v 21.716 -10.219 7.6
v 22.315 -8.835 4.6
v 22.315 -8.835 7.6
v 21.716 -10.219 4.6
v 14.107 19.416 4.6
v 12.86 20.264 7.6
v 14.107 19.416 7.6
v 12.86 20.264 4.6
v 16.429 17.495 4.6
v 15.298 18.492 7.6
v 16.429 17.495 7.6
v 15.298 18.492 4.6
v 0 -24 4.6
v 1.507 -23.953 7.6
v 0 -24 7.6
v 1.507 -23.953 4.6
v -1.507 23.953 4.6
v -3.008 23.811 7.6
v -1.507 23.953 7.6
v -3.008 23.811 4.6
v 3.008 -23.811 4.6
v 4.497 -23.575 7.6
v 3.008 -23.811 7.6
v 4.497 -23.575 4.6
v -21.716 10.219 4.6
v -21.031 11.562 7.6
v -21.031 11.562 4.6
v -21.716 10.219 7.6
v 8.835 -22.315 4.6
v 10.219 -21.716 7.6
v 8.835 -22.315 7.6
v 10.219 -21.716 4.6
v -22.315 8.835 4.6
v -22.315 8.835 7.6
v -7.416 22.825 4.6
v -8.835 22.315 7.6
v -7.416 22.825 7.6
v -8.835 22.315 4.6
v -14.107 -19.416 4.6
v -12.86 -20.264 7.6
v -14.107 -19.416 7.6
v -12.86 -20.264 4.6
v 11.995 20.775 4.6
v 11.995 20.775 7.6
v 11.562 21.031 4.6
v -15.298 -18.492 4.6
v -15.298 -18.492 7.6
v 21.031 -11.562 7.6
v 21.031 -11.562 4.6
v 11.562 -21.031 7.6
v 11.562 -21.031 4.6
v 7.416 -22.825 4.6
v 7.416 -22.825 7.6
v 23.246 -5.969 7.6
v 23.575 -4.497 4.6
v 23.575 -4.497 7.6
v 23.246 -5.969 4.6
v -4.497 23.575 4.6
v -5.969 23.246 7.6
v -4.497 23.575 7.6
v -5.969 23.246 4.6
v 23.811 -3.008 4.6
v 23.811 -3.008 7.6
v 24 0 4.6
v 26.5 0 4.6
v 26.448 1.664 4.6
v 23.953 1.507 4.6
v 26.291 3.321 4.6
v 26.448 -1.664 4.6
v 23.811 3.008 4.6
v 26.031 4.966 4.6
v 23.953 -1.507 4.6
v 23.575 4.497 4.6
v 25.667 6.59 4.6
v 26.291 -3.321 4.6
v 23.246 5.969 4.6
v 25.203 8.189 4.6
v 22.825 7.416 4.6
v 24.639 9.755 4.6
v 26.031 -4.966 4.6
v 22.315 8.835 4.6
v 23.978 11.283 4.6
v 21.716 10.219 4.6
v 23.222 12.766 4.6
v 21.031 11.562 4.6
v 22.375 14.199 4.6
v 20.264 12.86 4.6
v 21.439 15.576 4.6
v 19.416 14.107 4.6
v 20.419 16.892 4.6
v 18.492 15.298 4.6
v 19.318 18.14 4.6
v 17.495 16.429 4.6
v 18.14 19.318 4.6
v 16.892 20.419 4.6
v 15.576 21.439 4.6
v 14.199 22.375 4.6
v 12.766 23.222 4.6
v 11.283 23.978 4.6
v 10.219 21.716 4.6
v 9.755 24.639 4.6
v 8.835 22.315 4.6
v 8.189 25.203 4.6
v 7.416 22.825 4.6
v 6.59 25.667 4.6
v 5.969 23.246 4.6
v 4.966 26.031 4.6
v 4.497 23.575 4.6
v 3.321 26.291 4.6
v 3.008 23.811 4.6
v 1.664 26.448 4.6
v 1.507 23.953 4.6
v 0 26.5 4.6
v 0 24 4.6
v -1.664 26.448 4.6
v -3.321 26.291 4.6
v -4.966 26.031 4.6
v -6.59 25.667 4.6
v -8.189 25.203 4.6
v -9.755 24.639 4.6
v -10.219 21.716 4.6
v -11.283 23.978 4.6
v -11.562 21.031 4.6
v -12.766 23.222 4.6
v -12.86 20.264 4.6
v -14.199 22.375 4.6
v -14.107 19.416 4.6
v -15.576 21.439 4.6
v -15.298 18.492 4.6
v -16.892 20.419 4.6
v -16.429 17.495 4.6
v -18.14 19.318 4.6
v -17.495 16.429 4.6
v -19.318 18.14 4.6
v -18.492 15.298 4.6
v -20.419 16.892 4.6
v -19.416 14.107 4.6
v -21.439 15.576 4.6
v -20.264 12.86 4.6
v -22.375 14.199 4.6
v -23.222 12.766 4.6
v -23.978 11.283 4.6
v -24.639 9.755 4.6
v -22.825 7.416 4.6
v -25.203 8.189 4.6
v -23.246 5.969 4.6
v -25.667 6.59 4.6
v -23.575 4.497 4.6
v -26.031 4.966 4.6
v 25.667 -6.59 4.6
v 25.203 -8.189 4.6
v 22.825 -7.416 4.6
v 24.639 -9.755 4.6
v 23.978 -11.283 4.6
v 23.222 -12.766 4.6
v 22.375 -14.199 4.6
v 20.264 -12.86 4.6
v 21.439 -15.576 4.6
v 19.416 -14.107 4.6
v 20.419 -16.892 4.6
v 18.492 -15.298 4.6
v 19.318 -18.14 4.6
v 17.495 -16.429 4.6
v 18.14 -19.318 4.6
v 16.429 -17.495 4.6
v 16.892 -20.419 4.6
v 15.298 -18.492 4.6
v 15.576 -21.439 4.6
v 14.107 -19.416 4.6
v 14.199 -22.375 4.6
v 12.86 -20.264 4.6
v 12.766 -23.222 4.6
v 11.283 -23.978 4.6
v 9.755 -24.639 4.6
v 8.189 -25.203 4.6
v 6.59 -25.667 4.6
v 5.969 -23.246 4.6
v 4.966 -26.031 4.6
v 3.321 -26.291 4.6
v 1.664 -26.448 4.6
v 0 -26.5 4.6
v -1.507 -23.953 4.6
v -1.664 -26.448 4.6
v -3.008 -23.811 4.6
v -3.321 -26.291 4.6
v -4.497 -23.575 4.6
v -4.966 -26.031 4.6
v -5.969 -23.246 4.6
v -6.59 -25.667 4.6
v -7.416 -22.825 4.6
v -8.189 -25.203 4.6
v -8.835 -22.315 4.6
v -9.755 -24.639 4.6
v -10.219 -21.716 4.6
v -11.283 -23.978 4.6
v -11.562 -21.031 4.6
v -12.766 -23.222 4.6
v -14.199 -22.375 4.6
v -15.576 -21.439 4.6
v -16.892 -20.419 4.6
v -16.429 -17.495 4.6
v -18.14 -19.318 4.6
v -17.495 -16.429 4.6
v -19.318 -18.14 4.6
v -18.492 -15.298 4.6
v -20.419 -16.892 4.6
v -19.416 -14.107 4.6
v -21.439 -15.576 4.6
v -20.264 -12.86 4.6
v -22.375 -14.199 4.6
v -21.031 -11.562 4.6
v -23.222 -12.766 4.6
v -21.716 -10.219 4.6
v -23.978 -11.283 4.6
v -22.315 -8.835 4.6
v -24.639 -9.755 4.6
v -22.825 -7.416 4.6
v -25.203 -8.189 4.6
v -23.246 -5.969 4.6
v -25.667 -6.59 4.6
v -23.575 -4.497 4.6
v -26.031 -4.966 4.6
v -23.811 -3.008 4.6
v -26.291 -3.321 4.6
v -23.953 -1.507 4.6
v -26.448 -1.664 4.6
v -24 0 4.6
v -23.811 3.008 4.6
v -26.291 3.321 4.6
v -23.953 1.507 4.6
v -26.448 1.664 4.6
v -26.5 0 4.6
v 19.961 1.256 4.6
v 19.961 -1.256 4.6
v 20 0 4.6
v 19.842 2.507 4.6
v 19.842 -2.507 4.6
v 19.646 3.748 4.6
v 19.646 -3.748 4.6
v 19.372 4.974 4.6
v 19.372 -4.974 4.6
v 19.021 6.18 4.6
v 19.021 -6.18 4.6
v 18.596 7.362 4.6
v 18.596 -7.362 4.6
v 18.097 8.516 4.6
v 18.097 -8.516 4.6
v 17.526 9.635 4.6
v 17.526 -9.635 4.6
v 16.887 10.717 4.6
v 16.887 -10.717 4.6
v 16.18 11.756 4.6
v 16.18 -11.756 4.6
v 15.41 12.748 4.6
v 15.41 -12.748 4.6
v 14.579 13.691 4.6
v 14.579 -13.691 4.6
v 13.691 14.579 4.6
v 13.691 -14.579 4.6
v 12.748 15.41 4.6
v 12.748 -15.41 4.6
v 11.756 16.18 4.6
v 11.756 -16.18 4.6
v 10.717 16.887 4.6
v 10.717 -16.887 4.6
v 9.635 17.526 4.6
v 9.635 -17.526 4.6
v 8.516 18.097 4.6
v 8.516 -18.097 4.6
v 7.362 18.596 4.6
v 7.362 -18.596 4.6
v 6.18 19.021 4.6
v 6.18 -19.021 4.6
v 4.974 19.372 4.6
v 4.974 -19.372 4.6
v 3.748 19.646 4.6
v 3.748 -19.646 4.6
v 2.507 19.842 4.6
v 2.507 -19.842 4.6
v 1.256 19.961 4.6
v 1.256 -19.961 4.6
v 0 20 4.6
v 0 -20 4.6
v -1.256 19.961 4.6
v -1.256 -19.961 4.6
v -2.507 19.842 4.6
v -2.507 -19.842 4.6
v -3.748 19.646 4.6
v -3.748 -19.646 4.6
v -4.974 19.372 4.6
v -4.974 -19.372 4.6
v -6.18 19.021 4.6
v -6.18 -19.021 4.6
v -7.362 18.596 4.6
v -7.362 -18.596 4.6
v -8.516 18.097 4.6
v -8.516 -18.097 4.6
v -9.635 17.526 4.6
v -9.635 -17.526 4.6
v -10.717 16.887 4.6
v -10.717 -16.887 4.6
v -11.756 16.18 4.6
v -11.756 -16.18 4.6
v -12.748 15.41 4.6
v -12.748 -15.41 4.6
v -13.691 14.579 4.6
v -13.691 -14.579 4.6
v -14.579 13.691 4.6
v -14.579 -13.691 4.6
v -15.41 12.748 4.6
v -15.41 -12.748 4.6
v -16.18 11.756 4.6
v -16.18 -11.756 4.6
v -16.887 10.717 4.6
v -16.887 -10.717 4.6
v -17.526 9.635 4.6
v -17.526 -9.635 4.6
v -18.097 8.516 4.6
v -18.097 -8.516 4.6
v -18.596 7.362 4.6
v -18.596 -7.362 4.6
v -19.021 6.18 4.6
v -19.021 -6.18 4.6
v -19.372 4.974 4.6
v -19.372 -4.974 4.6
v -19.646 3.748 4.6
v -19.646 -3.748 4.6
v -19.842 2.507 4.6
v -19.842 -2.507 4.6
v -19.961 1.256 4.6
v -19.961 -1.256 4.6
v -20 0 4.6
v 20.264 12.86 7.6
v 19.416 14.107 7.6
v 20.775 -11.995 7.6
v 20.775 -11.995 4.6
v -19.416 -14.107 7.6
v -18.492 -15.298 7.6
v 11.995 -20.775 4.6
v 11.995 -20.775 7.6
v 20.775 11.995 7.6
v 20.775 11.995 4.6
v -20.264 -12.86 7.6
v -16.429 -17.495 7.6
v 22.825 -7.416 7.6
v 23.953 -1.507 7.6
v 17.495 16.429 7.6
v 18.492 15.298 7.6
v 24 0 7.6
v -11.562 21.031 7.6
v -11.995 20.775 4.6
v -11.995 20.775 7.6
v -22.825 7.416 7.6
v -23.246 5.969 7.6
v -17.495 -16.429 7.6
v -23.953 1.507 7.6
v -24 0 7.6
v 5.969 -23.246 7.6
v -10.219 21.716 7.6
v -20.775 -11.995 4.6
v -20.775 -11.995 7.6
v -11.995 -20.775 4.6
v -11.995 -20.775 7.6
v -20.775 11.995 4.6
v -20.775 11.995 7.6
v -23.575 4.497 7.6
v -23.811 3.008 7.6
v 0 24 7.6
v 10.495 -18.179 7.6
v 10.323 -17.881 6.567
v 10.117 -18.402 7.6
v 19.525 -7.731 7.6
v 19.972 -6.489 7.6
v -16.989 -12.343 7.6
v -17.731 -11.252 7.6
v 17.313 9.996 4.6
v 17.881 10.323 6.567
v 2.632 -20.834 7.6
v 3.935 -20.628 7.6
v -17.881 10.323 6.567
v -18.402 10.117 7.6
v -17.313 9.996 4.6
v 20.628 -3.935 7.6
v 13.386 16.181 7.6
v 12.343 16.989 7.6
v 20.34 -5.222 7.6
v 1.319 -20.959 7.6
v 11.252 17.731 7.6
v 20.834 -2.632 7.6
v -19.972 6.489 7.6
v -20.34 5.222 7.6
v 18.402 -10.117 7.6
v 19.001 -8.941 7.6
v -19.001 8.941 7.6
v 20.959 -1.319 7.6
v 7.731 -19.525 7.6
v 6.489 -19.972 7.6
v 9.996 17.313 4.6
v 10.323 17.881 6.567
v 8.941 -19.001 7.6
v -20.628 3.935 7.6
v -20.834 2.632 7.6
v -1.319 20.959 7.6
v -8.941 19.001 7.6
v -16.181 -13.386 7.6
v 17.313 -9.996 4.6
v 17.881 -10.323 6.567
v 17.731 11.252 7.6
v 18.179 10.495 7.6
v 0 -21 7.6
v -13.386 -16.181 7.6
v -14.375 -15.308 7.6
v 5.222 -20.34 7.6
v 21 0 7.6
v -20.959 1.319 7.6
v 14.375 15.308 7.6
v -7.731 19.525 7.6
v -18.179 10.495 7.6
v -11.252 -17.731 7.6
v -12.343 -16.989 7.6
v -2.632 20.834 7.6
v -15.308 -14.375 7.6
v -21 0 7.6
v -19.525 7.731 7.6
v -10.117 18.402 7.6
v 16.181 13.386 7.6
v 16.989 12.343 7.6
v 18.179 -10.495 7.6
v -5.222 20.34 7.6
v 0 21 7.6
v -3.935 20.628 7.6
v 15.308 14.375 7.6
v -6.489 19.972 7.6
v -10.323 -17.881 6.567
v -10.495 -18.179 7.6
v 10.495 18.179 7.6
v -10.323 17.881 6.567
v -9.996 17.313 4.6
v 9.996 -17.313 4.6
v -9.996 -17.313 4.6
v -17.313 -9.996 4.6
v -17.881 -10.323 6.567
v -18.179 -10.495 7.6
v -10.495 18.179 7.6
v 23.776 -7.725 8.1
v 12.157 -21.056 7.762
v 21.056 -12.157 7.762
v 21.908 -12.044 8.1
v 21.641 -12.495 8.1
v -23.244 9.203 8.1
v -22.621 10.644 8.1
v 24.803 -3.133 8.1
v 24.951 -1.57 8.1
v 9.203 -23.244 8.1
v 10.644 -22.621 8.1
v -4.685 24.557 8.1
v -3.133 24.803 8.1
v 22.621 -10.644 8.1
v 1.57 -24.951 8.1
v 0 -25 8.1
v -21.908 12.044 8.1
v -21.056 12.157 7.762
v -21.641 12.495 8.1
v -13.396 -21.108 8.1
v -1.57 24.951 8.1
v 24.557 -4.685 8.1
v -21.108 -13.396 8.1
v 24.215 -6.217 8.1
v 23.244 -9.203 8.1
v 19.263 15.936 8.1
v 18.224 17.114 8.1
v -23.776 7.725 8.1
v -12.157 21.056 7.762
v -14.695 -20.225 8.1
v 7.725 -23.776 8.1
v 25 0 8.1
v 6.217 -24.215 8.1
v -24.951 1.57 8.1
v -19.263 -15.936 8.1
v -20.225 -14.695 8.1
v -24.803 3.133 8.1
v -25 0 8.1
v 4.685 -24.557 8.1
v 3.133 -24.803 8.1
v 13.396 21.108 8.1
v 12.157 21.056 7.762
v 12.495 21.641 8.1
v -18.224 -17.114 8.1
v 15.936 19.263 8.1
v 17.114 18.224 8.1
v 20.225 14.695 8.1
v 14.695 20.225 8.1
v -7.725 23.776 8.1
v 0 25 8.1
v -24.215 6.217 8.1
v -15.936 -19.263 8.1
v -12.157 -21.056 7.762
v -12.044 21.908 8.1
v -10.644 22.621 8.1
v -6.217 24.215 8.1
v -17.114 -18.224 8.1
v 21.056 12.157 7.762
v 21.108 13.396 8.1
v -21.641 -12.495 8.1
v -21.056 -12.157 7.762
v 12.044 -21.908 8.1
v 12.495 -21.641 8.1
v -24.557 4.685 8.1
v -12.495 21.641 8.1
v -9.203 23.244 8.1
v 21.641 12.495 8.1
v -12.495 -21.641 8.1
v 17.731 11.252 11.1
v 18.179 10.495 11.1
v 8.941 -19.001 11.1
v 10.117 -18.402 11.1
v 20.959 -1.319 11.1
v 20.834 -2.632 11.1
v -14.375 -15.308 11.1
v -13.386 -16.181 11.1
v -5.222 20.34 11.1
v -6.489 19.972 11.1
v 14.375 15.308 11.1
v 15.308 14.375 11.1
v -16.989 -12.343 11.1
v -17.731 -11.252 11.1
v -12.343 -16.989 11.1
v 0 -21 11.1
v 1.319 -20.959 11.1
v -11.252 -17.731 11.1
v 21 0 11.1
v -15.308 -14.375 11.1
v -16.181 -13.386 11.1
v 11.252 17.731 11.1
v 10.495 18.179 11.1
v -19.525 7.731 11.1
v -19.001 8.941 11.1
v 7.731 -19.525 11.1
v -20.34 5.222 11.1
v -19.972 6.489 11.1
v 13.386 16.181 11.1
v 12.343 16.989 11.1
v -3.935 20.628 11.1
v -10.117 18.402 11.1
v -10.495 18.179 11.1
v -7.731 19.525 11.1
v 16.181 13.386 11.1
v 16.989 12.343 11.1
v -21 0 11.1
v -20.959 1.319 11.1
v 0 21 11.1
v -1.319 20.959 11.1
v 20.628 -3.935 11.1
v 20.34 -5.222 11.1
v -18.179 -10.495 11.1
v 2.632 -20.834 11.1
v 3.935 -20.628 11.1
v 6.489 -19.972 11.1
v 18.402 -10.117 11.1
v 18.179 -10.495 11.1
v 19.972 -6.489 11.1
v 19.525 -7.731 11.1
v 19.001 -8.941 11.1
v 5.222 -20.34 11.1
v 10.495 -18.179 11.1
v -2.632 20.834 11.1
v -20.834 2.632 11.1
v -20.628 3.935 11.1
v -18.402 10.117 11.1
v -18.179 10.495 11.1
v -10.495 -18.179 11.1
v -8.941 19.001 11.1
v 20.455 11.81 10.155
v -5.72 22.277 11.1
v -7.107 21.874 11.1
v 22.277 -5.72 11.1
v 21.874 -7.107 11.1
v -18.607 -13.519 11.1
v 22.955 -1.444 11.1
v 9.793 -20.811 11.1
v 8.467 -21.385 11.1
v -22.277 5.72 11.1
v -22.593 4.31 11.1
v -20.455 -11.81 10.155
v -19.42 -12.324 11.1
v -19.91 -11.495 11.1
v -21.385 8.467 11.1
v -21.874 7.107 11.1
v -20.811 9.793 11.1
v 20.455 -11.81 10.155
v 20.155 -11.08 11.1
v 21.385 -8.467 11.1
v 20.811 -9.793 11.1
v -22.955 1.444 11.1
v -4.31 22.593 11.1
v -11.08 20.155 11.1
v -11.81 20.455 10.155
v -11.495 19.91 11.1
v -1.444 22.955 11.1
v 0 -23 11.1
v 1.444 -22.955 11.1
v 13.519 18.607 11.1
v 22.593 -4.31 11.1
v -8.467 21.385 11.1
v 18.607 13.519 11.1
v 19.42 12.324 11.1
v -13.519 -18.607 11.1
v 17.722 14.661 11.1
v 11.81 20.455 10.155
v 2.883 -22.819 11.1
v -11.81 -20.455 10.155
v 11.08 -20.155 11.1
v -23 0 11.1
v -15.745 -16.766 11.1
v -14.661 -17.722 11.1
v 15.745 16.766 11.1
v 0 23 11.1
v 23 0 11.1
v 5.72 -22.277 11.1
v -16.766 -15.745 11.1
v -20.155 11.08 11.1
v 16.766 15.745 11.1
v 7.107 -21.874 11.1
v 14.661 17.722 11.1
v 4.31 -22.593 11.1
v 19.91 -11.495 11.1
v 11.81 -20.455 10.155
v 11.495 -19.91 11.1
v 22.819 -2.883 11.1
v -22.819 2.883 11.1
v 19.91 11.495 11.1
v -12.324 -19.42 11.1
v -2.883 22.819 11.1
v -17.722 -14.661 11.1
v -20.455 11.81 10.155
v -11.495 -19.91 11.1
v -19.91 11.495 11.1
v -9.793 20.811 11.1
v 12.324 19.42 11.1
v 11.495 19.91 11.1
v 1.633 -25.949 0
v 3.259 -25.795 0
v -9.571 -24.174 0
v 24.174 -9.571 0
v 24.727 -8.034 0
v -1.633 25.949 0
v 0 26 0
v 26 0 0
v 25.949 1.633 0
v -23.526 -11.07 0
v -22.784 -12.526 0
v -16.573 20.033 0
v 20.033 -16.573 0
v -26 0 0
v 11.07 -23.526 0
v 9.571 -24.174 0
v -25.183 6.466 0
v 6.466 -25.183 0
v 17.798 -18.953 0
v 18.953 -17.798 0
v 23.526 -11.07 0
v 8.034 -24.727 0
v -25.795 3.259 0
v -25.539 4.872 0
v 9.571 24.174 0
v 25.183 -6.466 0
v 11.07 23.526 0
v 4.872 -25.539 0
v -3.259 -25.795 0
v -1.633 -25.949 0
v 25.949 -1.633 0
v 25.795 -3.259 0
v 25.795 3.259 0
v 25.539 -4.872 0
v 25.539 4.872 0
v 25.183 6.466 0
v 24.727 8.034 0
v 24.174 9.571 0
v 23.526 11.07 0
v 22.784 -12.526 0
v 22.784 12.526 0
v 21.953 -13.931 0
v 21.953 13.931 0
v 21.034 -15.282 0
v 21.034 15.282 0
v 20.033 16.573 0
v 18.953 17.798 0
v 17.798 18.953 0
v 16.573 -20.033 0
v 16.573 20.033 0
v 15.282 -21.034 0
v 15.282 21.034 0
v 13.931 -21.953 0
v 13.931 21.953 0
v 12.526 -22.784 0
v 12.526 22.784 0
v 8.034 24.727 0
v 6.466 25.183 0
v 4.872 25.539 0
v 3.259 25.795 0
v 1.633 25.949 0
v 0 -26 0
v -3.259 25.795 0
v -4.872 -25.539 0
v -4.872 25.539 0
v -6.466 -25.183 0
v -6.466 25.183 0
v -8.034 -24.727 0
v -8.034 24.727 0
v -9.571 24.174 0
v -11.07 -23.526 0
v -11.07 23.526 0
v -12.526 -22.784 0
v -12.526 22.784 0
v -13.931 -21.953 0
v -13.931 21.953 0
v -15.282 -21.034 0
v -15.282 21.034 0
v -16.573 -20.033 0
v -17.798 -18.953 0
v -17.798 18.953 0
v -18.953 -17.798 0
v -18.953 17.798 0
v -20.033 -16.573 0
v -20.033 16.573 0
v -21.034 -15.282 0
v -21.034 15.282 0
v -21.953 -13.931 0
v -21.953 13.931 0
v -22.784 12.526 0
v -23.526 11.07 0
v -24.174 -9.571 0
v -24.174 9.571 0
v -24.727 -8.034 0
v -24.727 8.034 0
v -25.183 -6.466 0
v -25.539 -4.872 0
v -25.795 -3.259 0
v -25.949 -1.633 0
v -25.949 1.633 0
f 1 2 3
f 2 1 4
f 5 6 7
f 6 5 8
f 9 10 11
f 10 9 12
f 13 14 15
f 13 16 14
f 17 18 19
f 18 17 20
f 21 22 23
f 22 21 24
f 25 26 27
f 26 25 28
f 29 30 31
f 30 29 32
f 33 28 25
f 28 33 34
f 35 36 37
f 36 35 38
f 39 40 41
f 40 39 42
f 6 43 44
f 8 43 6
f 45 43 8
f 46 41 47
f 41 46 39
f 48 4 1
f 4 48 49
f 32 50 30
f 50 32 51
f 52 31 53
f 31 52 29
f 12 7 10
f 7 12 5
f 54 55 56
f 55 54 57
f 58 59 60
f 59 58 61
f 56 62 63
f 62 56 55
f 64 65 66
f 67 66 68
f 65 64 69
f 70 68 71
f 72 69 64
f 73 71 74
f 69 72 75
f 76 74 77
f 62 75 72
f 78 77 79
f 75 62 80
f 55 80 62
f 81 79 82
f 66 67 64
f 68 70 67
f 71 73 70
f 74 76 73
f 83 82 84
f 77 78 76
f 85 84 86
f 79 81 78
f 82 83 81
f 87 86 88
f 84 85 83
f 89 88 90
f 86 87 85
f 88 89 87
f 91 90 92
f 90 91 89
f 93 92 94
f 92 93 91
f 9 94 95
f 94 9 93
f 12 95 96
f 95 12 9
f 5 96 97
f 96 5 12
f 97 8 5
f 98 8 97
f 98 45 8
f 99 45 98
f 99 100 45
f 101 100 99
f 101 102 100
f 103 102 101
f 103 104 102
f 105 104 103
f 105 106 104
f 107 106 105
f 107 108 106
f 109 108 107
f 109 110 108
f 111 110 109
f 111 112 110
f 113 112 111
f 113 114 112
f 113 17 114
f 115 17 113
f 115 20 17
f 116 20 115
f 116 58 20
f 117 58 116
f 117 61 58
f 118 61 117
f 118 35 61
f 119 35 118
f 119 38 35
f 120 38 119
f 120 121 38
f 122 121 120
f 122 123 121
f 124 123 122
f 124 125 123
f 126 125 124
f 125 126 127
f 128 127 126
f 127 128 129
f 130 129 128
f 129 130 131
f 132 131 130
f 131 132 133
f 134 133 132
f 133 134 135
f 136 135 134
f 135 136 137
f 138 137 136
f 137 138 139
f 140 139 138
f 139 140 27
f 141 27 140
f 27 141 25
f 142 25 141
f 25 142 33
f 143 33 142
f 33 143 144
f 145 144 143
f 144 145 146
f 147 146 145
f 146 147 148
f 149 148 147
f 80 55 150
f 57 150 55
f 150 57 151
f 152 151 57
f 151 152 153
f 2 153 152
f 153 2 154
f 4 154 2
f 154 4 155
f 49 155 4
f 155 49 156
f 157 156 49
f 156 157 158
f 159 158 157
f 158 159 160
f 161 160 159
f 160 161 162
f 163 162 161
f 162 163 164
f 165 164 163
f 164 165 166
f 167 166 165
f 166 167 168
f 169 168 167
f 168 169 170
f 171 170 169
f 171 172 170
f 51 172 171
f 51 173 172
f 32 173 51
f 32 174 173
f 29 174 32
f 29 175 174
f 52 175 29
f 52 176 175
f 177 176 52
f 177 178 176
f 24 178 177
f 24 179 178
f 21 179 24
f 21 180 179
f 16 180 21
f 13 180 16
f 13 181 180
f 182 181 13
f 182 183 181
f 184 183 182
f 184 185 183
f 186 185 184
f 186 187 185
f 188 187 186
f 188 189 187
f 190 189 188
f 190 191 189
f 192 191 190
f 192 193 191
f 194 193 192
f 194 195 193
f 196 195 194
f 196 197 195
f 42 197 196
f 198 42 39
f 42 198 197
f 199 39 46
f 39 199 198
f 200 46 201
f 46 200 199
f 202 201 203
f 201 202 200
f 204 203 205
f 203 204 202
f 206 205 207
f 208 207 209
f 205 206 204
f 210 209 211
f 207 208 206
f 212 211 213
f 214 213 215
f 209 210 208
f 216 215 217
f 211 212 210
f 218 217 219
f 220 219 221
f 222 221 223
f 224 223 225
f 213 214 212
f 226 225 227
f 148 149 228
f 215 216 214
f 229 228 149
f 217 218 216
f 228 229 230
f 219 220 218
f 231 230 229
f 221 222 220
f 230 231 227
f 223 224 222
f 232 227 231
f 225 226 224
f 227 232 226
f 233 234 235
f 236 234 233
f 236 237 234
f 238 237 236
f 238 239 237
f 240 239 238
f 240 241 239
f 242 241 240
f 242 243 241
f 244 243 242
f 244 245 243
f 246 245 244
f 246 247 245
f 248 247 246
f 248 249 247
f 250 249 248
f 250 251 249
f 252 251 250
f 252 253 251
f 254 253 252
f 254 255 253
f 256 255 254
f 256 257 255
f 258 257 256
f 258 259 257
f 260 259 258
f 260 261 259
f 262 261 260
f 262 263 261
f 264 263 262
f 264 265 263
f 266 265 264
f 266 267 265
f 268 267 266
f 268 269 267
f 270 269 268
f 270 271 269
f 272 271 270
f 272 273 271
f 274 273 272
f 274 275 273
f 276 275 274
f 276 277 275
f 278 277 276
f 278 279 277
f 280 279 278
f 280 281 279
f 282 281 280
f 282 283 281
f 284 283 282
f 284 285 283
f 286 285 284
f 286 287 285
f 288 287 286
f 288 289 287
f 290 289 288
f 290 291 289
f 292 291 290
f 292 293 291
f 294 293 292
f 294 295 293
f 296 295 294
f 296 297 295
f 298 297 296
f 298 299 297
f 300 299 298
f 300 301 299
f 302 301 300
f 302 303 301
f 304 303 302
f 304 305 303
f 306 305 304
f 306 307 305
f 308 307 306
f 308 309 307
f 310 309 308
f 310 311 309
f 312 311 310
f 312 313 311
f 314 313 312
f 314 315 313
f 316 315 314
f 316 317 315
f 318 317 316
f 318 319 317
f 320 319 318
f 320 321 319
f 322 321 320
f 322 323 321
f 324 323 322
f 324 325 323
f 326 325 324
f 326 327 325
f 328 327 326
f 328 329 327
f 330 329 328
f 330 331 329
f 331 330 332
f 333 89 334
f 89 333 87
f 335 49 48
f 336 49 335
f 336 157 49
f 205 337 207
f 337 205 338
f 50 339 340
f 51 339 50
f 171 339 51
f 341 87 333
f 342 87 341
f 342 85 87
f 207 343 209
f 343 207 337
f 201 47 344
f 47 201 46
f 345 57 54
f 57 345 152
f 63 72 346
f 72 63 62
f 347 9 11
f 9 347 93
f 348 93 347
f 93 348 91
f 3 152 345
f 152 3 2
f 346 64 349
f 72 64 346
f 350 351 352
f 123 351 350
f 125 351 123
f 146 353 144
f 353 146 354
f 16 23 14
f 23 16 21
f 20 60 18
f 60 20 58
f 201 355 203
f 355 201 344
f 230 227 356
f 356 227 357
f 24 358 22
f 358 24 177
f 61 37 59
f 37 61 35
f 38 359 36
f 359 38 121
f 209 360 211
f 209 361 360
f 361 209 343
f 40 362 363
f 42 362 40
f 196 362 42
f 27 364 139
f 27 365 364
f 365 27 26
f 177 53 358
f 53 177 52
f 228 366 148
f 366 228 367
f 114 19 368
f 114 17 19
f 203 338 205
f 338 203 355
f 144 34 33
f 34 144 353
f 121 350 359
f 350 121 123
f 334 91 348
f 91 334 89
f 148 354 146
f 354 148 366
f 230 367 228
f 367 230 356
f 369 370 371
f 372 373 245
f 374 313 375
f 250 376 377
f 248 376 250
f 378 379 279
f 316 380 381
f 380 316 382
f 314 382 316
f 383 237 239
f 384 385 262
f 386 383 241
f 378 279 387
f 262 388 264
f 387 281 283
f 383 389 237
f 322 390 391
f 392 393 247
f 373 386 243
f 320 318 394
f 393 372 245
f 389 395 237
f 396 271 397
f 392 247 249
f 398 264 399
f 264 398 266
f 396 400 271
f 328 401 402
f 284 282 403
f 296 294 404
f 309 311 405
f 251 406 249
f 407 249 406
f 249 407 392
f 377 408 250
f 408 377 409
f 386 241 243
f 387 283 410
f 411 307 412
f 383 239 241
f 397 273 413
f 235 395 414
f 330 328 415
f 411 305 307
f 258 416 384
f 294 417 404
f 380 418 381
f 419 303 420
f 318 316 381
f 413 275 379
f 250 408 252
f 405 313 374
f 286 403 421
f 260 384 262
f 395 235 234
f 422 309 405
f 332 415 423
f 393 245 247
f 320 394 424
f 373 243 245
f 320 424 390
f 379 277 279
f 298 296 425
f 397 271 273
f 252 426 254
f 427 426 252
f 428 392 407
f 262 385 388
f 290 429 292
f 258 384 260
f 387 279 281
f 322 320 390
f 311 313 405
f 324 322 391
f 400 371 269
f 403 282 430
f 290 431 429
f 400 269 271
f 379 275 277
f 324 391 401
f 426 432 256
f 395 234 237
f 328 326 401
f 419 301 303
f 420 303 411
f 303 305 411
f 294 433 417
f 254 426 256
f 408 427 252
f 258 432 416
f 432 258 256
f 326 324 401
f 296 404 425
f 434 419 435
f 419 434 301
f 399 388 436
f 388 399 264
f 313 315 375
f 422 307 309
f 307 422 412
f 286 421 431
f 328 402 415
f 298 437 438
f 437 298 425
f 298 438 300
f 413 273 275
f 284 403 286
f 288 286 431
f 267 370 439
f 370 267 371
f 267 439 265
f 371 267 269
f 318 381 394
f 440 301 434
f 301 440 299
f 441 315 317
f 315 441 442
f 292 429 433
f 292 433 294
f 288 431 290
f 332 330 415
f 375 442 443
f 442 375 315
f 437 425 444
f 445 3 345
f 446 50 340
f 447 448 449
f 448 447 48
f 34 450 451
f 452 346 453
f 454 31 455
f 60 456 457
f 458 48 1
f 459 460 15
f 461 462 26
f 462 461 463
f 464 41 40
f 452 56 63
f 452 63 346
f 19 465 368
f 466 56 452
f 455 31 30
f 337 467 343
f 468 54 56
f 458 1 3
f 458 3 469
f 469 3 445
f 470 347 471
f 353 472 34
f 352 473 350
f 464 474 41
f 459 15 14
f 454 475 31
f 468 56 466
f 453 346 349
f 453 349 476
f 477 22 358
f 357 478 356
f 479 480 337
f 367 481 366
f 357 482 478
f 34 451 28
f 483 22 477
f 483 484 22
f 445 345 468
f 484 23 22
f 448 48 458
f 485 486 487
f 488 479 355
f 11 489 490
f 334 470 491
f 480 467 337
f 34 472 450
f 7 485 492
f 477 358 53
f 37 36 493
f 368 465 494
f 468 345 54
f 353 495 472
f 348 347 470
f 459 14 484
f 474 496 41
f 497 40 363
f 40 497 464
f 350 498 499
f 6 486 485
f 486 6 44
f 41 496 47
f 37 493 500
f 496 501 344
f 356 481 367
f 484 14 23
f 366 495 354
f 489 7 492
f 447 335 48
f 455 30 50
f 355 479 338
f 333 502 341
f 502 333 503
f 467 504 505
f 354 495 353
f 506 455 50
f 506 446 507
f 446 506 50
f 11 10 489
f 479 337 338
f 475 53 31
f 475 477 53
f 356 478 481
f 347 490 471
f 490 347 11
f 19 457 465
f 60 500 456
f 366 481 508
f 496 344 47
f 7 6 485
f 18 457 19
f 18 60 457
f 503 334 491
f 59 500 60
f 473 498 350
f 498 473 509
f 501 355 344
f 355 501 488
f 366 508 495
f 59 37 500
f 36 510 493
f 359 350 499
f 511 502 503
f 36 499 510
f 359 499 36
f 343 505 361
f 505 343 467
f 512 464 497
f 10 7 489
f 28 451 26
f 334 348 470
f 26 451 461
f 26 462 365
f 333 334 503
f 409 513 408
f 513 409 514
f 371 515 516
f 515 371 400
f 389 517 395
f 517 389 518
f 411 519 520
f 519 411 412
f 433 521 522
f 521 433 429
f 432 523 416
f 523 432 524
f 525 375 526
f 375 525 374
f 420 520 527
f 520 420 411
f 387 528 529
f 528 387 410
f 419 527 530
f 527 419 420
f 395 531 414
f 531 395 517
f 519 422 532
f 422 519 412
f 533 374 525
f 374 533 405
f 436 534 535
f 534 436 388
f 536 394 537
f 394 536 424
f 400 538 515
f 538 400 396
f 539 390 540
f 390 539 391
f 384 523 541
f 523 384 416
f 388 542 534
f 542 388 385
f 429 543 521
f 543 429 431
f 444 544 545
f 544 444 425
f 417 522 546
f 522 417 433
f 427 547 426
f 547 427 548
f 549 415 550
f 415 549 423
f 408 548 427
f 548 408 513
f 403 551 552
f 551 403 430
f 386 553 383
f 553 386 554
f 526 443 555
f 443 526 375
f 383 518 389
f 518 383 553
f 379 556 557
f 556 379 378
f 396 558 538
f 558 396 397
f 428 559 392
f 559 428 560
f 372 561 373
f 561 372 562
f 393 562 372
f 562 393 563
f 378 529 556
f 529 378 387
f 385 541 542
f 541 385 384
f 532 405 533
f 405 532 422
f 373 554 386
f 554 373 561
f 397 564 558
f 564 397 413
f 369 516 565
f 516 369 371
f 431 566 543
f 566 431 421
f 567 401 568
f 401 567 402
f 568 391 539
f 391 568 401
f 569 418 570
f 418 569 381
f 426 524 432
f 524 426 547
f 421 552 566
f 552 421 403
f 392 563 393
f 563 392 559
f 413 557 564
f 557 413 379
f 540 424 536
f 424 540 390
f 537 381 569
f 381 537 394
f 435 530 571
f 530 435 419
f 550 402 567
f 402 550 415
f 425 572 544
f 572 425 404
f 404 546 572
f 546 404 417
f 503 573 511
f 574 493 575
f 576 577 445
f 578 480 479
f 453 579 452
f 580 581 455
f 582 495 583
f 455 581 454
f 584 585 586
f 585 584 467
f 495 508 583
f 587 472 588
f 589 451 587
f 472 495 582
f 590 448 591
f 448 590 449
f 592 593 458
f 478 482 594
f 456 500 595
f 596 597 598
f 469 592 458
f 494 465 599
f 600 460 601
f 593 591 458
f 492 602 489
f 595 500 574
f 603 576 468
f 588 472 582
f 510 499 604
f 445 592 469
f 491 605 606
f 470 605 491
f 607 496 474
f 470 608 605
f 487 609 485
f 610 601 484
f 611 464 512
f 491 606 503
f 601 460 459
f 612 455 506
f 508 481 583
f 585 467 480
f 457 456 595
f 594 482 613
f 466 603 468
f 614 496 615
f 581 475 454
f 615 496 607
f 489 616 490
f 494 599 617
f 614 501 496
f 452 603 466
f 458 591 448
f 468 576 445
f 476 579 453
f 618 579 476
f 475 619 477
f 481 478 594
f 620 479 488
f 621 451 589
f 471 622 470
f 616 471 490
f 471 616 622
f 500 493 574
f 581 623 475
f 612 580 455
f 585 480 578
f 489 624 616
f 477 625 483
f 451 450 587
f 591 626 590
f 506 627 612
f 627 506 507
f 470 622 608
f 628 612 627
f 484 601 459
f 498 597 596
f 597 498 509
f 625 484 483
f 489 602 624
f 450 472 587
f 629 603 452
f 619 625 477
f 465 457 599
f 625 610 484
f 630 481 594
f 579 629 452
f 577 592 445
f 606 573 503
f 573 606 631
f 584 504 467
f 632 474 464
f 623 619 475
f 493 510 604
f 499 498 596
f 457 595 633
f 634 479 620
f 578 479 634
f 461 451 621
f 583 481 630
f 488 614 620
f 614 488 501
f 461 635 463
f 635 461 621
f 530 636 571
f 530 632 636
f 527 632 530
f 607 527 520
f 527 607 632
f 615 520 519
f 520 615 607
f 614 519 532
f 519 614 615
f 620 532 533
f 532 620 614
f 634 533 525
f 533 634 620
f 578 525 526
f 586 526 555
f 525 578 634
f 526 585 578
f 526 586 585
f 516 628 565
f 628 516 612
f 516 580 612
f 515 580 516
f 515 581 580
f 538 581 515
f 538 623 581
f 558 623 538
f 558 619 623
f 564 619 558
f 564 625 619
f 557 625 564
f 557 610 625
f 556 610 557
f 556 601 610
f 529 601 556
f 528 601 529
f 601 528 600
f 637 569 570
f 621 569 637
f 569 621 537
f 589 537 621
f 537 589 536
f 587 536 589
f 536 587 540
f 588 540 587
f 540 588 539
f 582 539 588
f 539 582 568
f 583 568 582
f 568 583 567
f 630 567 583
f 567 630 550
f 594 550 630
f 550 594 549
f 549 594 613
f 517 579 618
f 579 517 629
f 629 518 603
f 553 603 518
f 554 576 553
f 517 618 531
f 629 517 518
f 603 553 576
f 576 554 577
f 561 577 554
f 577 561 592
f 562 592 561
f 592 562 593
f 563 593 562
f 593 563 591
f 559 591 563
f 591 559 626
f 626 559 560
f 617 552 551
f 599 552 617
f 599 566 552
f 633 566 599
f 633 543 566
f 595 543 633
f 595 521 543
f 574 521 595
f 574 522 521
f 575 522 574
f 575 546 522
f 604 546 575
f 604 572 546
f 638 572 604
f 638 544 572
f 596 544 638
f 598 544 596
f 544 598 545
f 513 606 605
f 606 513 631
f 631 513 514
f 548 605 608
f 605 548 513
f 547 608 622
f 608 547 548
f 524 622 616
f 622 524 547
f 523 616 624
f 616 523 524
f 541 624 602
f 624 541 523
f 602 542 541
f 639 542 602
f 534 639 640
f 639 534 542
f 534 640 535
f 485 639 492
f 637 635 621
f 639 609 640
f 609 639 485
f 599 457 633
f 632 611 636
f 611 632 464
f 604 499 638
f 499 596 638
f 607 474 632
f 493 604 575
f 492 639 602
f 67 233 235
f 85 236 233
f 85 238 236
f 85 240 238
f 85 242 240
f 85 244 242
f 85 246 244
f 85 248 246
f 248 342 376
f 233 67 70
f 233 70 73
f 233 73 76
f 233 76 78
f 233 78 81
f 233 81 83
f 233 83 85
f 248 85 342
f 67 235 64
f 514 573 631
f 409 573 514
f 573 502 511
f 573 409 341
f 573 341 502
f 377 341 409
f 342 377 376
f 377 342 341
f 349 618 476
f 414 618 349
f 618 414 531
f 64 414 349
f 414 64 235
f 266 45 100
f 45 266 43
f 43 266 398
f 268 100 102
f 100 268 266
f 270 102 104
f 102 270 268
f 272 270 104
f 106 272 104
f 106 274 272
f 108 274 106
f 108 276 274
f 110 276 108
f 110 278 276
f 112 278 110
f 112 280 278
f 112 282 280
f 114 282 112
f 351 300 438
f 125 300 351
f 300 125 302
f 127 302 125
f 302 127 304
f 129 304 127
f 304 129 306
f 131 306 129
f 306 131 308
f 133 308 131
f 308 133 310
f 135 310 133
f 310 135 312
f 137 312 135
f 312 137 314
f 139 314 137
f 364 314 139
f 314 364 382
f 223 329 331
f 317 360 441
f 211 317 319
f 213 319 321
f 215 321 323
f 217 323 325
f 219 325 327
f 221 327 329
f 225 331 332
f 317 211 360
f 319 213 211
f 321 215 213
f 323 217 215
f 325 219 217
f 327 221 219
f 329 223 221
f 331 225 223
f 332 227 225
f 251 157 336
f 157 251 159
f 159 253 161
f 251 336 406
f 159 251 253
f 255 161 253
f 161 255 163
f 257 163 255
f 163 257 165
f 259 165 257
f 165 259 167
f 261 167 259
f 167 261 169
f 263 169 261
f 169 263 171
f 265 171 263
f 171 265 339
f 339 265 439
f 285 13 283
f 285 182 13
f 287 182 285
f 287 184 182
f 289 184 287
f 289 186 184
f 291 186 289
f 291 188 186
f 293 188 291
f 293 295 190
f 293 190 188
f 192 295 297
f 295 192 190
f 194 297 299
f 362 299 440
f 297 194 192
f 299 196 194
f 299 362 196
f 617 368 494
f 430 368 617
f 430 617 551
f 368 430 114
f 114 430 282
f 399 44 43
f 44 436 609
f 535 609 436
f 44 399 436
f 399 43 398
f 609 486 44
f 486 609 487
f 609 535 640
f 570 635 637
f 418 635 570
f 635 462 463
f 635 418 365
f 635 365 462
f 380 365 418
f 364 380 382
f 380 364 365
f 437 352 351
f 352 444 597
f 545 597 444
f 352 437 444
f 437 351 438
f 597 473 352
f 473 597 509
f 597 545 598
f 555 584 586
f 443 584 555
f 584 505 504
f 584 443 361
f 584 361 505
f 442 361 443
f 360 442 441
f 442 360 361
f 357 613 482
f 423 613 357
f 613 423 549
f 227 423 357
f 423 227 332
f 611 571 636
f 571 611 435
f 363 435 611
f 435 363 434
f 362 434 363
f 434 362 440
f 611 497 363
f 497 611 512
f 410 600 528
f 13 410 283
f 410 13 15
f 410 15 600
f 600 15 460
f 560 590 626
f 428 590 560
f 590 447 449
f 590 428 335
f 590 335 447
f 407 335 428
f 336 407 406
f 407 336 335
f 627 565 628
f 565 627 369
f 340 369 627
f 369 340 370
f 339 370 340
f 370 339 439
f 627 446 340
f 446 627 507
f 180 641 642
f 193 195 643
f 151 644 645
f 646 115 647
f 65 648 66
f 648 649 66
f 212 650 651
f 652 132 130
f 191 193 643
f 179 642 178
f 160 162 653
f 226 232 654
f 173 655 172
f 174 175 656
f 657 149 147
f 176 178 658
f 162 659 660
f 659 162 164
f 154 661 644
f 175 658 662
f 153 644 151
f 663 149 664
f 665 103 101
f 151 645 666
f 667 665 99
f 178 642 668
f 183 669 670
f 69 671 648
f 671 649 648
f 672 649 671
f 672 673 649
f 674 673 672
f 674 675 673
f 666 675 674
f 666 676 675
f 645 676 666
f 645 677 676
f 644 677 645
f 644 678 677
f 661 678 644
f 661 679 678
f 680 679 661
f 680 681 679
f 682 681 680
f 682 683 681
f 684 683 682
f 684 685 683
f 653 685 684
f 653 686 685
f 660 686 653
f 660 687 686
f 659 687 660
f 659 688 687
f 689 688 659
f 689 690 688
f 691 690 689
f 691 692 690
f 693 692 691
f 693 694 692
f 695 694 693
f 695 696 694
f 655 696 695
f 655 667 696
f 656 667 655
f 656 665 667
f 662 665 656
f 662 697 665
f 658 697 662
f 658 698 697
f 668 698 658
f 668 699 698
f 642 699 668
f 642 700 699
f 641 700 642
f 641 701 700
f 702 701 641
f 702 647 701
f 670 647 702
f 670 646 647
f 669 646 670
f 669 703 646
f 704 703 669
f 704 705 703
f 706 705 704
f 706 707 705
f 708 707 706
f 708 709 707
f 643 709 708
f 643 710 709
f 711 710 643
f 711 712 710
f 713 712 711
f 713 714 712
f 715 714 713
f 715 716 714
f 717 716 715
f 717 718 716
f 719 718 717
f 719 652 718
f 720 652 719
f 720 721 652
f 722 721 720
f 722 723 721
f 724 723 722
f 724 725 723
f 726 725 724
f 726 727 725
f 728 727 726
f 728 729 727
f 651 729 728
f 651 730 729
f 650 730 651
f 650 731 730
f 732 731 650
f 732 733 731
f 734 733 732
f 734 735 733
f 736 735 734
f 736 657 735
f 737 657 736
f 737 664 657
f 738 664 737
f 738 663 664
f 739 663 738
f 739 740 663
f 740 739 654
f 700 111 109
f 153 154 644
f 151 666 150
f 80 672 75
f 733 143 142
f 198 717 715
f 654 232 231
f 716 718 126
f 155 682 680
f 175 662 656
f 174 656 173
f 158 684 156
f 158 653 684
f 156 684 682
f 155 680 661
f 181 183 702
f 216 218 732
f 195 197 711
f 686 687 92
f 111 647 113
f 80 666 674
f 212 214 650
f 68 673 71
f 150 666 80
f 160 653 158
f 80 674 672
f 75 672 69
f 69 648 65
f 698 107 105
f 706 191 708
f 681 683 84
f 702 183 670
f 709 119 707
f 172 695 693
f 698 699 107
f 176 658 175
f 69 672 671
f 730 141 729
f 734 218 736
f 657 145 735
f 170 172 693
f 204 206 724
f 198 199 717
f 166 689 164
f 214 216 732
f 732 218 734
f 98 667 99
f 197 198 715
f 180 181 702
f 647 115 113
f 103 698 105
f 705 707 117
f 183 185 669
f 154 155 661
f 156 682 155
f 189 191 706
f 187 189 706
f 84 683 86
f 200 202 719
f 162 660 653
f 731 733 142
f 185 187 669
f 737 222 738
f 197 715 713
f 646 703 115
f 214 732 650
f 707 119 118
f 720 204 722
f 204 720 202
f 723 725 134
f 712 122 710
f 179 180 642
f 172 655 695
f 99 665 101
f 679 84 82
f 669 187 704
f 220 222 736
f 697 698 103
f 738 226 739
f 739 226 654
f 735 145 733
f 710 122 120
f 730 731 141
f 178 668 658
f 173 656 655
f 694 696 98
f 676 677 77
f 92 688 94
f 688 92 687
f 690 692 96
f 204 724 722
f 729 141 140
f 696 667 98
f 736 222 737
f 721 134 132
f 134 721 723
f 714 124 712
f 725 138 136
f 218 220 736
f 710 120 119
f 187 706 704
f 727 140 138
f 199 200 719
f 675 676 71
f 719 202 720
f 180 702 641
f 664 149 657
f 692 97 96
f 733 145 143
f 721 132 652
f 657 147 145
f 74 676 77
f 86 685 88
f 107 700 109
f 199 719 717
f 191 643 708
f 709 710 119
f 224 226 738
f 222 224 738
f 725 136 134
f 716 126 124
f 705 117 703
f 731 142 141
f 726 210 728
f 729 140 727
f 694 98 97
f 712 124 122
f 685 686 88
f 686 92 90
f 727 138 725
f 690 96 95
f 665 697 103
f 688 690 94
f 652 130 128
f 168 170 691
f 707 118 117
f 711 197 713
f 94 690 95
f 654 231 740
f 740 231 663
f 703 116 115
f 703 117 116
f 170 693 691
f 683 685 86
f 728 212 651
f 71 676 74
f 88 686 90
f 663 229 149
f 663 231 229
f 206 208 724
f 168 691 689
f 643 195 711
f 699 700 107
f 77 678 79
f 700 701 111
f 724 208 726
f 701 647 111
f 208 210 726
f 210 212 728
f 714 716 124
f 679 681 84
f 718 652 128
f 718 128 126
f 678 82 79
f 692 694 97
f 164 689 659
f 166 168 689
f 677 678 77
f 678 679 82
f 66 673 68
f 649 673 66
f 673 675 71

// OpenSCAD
// fedlap
cylinder (h = 4.6, r1=26, r2=26.5, center = false, $fn=100);

module labak() {// labak
difference(){
    translate([0,0,4.6])
    cylinder (h = 3, r=24, center = false, $fn=100);
    translate([0,0,4.6])
    cylinder (h = 3, r1=20, r2=21, center = false, $fn=100);
};

// fulek1
difference(){
    translate([0,0,7.6])
    cylinder (h = 0.5, r1=24, r2=25, center = false, $fn=100);
    translate([0,0,7.6])
    cylinder (h = 0.5, r=21, center = false, $fn=100);
};

// fulek2
difference(){
    translate([0,0,8.1])
    cylinder (h = 3, r1=25, r2=23, center = false, $fn=100);
    translate([0,0,8.1])
    cylinder (h = 3, r=21, center = false, $fn=100);
};
}

radius = 27;
angles = [0, 360/12];
fn = 10;
height = 8;

module sector(radius, angles, height, fn = 24) {
    step = -360 / fn;

    points = concat([[0, 0]],
        [for(a = [angles[0] : step : angles[1] - 360]) 
            [radius * cos(a), radius * sin(a)]
        ],
        [[radius * cos(angles[1]), radius * sin(angles[1])]]
    );

    linear_extrude(height)
    difference() {
        circle(radius, $fn = fn);
        #polygon(points);
    }
}
difference(){
labak();
translate([0,0,4.6]) {
    sector(radius, [0, 30], height, fn);
    sector(radius, [60, 90], height, fn);
    sector(radius, [120, 150], height, fn);
    sector(radius, [180, 210], height, fn);
    sector(radius, [240, 270], height, fn);
    sector(radius, [300, 330], height, fn);
    
    };
}
